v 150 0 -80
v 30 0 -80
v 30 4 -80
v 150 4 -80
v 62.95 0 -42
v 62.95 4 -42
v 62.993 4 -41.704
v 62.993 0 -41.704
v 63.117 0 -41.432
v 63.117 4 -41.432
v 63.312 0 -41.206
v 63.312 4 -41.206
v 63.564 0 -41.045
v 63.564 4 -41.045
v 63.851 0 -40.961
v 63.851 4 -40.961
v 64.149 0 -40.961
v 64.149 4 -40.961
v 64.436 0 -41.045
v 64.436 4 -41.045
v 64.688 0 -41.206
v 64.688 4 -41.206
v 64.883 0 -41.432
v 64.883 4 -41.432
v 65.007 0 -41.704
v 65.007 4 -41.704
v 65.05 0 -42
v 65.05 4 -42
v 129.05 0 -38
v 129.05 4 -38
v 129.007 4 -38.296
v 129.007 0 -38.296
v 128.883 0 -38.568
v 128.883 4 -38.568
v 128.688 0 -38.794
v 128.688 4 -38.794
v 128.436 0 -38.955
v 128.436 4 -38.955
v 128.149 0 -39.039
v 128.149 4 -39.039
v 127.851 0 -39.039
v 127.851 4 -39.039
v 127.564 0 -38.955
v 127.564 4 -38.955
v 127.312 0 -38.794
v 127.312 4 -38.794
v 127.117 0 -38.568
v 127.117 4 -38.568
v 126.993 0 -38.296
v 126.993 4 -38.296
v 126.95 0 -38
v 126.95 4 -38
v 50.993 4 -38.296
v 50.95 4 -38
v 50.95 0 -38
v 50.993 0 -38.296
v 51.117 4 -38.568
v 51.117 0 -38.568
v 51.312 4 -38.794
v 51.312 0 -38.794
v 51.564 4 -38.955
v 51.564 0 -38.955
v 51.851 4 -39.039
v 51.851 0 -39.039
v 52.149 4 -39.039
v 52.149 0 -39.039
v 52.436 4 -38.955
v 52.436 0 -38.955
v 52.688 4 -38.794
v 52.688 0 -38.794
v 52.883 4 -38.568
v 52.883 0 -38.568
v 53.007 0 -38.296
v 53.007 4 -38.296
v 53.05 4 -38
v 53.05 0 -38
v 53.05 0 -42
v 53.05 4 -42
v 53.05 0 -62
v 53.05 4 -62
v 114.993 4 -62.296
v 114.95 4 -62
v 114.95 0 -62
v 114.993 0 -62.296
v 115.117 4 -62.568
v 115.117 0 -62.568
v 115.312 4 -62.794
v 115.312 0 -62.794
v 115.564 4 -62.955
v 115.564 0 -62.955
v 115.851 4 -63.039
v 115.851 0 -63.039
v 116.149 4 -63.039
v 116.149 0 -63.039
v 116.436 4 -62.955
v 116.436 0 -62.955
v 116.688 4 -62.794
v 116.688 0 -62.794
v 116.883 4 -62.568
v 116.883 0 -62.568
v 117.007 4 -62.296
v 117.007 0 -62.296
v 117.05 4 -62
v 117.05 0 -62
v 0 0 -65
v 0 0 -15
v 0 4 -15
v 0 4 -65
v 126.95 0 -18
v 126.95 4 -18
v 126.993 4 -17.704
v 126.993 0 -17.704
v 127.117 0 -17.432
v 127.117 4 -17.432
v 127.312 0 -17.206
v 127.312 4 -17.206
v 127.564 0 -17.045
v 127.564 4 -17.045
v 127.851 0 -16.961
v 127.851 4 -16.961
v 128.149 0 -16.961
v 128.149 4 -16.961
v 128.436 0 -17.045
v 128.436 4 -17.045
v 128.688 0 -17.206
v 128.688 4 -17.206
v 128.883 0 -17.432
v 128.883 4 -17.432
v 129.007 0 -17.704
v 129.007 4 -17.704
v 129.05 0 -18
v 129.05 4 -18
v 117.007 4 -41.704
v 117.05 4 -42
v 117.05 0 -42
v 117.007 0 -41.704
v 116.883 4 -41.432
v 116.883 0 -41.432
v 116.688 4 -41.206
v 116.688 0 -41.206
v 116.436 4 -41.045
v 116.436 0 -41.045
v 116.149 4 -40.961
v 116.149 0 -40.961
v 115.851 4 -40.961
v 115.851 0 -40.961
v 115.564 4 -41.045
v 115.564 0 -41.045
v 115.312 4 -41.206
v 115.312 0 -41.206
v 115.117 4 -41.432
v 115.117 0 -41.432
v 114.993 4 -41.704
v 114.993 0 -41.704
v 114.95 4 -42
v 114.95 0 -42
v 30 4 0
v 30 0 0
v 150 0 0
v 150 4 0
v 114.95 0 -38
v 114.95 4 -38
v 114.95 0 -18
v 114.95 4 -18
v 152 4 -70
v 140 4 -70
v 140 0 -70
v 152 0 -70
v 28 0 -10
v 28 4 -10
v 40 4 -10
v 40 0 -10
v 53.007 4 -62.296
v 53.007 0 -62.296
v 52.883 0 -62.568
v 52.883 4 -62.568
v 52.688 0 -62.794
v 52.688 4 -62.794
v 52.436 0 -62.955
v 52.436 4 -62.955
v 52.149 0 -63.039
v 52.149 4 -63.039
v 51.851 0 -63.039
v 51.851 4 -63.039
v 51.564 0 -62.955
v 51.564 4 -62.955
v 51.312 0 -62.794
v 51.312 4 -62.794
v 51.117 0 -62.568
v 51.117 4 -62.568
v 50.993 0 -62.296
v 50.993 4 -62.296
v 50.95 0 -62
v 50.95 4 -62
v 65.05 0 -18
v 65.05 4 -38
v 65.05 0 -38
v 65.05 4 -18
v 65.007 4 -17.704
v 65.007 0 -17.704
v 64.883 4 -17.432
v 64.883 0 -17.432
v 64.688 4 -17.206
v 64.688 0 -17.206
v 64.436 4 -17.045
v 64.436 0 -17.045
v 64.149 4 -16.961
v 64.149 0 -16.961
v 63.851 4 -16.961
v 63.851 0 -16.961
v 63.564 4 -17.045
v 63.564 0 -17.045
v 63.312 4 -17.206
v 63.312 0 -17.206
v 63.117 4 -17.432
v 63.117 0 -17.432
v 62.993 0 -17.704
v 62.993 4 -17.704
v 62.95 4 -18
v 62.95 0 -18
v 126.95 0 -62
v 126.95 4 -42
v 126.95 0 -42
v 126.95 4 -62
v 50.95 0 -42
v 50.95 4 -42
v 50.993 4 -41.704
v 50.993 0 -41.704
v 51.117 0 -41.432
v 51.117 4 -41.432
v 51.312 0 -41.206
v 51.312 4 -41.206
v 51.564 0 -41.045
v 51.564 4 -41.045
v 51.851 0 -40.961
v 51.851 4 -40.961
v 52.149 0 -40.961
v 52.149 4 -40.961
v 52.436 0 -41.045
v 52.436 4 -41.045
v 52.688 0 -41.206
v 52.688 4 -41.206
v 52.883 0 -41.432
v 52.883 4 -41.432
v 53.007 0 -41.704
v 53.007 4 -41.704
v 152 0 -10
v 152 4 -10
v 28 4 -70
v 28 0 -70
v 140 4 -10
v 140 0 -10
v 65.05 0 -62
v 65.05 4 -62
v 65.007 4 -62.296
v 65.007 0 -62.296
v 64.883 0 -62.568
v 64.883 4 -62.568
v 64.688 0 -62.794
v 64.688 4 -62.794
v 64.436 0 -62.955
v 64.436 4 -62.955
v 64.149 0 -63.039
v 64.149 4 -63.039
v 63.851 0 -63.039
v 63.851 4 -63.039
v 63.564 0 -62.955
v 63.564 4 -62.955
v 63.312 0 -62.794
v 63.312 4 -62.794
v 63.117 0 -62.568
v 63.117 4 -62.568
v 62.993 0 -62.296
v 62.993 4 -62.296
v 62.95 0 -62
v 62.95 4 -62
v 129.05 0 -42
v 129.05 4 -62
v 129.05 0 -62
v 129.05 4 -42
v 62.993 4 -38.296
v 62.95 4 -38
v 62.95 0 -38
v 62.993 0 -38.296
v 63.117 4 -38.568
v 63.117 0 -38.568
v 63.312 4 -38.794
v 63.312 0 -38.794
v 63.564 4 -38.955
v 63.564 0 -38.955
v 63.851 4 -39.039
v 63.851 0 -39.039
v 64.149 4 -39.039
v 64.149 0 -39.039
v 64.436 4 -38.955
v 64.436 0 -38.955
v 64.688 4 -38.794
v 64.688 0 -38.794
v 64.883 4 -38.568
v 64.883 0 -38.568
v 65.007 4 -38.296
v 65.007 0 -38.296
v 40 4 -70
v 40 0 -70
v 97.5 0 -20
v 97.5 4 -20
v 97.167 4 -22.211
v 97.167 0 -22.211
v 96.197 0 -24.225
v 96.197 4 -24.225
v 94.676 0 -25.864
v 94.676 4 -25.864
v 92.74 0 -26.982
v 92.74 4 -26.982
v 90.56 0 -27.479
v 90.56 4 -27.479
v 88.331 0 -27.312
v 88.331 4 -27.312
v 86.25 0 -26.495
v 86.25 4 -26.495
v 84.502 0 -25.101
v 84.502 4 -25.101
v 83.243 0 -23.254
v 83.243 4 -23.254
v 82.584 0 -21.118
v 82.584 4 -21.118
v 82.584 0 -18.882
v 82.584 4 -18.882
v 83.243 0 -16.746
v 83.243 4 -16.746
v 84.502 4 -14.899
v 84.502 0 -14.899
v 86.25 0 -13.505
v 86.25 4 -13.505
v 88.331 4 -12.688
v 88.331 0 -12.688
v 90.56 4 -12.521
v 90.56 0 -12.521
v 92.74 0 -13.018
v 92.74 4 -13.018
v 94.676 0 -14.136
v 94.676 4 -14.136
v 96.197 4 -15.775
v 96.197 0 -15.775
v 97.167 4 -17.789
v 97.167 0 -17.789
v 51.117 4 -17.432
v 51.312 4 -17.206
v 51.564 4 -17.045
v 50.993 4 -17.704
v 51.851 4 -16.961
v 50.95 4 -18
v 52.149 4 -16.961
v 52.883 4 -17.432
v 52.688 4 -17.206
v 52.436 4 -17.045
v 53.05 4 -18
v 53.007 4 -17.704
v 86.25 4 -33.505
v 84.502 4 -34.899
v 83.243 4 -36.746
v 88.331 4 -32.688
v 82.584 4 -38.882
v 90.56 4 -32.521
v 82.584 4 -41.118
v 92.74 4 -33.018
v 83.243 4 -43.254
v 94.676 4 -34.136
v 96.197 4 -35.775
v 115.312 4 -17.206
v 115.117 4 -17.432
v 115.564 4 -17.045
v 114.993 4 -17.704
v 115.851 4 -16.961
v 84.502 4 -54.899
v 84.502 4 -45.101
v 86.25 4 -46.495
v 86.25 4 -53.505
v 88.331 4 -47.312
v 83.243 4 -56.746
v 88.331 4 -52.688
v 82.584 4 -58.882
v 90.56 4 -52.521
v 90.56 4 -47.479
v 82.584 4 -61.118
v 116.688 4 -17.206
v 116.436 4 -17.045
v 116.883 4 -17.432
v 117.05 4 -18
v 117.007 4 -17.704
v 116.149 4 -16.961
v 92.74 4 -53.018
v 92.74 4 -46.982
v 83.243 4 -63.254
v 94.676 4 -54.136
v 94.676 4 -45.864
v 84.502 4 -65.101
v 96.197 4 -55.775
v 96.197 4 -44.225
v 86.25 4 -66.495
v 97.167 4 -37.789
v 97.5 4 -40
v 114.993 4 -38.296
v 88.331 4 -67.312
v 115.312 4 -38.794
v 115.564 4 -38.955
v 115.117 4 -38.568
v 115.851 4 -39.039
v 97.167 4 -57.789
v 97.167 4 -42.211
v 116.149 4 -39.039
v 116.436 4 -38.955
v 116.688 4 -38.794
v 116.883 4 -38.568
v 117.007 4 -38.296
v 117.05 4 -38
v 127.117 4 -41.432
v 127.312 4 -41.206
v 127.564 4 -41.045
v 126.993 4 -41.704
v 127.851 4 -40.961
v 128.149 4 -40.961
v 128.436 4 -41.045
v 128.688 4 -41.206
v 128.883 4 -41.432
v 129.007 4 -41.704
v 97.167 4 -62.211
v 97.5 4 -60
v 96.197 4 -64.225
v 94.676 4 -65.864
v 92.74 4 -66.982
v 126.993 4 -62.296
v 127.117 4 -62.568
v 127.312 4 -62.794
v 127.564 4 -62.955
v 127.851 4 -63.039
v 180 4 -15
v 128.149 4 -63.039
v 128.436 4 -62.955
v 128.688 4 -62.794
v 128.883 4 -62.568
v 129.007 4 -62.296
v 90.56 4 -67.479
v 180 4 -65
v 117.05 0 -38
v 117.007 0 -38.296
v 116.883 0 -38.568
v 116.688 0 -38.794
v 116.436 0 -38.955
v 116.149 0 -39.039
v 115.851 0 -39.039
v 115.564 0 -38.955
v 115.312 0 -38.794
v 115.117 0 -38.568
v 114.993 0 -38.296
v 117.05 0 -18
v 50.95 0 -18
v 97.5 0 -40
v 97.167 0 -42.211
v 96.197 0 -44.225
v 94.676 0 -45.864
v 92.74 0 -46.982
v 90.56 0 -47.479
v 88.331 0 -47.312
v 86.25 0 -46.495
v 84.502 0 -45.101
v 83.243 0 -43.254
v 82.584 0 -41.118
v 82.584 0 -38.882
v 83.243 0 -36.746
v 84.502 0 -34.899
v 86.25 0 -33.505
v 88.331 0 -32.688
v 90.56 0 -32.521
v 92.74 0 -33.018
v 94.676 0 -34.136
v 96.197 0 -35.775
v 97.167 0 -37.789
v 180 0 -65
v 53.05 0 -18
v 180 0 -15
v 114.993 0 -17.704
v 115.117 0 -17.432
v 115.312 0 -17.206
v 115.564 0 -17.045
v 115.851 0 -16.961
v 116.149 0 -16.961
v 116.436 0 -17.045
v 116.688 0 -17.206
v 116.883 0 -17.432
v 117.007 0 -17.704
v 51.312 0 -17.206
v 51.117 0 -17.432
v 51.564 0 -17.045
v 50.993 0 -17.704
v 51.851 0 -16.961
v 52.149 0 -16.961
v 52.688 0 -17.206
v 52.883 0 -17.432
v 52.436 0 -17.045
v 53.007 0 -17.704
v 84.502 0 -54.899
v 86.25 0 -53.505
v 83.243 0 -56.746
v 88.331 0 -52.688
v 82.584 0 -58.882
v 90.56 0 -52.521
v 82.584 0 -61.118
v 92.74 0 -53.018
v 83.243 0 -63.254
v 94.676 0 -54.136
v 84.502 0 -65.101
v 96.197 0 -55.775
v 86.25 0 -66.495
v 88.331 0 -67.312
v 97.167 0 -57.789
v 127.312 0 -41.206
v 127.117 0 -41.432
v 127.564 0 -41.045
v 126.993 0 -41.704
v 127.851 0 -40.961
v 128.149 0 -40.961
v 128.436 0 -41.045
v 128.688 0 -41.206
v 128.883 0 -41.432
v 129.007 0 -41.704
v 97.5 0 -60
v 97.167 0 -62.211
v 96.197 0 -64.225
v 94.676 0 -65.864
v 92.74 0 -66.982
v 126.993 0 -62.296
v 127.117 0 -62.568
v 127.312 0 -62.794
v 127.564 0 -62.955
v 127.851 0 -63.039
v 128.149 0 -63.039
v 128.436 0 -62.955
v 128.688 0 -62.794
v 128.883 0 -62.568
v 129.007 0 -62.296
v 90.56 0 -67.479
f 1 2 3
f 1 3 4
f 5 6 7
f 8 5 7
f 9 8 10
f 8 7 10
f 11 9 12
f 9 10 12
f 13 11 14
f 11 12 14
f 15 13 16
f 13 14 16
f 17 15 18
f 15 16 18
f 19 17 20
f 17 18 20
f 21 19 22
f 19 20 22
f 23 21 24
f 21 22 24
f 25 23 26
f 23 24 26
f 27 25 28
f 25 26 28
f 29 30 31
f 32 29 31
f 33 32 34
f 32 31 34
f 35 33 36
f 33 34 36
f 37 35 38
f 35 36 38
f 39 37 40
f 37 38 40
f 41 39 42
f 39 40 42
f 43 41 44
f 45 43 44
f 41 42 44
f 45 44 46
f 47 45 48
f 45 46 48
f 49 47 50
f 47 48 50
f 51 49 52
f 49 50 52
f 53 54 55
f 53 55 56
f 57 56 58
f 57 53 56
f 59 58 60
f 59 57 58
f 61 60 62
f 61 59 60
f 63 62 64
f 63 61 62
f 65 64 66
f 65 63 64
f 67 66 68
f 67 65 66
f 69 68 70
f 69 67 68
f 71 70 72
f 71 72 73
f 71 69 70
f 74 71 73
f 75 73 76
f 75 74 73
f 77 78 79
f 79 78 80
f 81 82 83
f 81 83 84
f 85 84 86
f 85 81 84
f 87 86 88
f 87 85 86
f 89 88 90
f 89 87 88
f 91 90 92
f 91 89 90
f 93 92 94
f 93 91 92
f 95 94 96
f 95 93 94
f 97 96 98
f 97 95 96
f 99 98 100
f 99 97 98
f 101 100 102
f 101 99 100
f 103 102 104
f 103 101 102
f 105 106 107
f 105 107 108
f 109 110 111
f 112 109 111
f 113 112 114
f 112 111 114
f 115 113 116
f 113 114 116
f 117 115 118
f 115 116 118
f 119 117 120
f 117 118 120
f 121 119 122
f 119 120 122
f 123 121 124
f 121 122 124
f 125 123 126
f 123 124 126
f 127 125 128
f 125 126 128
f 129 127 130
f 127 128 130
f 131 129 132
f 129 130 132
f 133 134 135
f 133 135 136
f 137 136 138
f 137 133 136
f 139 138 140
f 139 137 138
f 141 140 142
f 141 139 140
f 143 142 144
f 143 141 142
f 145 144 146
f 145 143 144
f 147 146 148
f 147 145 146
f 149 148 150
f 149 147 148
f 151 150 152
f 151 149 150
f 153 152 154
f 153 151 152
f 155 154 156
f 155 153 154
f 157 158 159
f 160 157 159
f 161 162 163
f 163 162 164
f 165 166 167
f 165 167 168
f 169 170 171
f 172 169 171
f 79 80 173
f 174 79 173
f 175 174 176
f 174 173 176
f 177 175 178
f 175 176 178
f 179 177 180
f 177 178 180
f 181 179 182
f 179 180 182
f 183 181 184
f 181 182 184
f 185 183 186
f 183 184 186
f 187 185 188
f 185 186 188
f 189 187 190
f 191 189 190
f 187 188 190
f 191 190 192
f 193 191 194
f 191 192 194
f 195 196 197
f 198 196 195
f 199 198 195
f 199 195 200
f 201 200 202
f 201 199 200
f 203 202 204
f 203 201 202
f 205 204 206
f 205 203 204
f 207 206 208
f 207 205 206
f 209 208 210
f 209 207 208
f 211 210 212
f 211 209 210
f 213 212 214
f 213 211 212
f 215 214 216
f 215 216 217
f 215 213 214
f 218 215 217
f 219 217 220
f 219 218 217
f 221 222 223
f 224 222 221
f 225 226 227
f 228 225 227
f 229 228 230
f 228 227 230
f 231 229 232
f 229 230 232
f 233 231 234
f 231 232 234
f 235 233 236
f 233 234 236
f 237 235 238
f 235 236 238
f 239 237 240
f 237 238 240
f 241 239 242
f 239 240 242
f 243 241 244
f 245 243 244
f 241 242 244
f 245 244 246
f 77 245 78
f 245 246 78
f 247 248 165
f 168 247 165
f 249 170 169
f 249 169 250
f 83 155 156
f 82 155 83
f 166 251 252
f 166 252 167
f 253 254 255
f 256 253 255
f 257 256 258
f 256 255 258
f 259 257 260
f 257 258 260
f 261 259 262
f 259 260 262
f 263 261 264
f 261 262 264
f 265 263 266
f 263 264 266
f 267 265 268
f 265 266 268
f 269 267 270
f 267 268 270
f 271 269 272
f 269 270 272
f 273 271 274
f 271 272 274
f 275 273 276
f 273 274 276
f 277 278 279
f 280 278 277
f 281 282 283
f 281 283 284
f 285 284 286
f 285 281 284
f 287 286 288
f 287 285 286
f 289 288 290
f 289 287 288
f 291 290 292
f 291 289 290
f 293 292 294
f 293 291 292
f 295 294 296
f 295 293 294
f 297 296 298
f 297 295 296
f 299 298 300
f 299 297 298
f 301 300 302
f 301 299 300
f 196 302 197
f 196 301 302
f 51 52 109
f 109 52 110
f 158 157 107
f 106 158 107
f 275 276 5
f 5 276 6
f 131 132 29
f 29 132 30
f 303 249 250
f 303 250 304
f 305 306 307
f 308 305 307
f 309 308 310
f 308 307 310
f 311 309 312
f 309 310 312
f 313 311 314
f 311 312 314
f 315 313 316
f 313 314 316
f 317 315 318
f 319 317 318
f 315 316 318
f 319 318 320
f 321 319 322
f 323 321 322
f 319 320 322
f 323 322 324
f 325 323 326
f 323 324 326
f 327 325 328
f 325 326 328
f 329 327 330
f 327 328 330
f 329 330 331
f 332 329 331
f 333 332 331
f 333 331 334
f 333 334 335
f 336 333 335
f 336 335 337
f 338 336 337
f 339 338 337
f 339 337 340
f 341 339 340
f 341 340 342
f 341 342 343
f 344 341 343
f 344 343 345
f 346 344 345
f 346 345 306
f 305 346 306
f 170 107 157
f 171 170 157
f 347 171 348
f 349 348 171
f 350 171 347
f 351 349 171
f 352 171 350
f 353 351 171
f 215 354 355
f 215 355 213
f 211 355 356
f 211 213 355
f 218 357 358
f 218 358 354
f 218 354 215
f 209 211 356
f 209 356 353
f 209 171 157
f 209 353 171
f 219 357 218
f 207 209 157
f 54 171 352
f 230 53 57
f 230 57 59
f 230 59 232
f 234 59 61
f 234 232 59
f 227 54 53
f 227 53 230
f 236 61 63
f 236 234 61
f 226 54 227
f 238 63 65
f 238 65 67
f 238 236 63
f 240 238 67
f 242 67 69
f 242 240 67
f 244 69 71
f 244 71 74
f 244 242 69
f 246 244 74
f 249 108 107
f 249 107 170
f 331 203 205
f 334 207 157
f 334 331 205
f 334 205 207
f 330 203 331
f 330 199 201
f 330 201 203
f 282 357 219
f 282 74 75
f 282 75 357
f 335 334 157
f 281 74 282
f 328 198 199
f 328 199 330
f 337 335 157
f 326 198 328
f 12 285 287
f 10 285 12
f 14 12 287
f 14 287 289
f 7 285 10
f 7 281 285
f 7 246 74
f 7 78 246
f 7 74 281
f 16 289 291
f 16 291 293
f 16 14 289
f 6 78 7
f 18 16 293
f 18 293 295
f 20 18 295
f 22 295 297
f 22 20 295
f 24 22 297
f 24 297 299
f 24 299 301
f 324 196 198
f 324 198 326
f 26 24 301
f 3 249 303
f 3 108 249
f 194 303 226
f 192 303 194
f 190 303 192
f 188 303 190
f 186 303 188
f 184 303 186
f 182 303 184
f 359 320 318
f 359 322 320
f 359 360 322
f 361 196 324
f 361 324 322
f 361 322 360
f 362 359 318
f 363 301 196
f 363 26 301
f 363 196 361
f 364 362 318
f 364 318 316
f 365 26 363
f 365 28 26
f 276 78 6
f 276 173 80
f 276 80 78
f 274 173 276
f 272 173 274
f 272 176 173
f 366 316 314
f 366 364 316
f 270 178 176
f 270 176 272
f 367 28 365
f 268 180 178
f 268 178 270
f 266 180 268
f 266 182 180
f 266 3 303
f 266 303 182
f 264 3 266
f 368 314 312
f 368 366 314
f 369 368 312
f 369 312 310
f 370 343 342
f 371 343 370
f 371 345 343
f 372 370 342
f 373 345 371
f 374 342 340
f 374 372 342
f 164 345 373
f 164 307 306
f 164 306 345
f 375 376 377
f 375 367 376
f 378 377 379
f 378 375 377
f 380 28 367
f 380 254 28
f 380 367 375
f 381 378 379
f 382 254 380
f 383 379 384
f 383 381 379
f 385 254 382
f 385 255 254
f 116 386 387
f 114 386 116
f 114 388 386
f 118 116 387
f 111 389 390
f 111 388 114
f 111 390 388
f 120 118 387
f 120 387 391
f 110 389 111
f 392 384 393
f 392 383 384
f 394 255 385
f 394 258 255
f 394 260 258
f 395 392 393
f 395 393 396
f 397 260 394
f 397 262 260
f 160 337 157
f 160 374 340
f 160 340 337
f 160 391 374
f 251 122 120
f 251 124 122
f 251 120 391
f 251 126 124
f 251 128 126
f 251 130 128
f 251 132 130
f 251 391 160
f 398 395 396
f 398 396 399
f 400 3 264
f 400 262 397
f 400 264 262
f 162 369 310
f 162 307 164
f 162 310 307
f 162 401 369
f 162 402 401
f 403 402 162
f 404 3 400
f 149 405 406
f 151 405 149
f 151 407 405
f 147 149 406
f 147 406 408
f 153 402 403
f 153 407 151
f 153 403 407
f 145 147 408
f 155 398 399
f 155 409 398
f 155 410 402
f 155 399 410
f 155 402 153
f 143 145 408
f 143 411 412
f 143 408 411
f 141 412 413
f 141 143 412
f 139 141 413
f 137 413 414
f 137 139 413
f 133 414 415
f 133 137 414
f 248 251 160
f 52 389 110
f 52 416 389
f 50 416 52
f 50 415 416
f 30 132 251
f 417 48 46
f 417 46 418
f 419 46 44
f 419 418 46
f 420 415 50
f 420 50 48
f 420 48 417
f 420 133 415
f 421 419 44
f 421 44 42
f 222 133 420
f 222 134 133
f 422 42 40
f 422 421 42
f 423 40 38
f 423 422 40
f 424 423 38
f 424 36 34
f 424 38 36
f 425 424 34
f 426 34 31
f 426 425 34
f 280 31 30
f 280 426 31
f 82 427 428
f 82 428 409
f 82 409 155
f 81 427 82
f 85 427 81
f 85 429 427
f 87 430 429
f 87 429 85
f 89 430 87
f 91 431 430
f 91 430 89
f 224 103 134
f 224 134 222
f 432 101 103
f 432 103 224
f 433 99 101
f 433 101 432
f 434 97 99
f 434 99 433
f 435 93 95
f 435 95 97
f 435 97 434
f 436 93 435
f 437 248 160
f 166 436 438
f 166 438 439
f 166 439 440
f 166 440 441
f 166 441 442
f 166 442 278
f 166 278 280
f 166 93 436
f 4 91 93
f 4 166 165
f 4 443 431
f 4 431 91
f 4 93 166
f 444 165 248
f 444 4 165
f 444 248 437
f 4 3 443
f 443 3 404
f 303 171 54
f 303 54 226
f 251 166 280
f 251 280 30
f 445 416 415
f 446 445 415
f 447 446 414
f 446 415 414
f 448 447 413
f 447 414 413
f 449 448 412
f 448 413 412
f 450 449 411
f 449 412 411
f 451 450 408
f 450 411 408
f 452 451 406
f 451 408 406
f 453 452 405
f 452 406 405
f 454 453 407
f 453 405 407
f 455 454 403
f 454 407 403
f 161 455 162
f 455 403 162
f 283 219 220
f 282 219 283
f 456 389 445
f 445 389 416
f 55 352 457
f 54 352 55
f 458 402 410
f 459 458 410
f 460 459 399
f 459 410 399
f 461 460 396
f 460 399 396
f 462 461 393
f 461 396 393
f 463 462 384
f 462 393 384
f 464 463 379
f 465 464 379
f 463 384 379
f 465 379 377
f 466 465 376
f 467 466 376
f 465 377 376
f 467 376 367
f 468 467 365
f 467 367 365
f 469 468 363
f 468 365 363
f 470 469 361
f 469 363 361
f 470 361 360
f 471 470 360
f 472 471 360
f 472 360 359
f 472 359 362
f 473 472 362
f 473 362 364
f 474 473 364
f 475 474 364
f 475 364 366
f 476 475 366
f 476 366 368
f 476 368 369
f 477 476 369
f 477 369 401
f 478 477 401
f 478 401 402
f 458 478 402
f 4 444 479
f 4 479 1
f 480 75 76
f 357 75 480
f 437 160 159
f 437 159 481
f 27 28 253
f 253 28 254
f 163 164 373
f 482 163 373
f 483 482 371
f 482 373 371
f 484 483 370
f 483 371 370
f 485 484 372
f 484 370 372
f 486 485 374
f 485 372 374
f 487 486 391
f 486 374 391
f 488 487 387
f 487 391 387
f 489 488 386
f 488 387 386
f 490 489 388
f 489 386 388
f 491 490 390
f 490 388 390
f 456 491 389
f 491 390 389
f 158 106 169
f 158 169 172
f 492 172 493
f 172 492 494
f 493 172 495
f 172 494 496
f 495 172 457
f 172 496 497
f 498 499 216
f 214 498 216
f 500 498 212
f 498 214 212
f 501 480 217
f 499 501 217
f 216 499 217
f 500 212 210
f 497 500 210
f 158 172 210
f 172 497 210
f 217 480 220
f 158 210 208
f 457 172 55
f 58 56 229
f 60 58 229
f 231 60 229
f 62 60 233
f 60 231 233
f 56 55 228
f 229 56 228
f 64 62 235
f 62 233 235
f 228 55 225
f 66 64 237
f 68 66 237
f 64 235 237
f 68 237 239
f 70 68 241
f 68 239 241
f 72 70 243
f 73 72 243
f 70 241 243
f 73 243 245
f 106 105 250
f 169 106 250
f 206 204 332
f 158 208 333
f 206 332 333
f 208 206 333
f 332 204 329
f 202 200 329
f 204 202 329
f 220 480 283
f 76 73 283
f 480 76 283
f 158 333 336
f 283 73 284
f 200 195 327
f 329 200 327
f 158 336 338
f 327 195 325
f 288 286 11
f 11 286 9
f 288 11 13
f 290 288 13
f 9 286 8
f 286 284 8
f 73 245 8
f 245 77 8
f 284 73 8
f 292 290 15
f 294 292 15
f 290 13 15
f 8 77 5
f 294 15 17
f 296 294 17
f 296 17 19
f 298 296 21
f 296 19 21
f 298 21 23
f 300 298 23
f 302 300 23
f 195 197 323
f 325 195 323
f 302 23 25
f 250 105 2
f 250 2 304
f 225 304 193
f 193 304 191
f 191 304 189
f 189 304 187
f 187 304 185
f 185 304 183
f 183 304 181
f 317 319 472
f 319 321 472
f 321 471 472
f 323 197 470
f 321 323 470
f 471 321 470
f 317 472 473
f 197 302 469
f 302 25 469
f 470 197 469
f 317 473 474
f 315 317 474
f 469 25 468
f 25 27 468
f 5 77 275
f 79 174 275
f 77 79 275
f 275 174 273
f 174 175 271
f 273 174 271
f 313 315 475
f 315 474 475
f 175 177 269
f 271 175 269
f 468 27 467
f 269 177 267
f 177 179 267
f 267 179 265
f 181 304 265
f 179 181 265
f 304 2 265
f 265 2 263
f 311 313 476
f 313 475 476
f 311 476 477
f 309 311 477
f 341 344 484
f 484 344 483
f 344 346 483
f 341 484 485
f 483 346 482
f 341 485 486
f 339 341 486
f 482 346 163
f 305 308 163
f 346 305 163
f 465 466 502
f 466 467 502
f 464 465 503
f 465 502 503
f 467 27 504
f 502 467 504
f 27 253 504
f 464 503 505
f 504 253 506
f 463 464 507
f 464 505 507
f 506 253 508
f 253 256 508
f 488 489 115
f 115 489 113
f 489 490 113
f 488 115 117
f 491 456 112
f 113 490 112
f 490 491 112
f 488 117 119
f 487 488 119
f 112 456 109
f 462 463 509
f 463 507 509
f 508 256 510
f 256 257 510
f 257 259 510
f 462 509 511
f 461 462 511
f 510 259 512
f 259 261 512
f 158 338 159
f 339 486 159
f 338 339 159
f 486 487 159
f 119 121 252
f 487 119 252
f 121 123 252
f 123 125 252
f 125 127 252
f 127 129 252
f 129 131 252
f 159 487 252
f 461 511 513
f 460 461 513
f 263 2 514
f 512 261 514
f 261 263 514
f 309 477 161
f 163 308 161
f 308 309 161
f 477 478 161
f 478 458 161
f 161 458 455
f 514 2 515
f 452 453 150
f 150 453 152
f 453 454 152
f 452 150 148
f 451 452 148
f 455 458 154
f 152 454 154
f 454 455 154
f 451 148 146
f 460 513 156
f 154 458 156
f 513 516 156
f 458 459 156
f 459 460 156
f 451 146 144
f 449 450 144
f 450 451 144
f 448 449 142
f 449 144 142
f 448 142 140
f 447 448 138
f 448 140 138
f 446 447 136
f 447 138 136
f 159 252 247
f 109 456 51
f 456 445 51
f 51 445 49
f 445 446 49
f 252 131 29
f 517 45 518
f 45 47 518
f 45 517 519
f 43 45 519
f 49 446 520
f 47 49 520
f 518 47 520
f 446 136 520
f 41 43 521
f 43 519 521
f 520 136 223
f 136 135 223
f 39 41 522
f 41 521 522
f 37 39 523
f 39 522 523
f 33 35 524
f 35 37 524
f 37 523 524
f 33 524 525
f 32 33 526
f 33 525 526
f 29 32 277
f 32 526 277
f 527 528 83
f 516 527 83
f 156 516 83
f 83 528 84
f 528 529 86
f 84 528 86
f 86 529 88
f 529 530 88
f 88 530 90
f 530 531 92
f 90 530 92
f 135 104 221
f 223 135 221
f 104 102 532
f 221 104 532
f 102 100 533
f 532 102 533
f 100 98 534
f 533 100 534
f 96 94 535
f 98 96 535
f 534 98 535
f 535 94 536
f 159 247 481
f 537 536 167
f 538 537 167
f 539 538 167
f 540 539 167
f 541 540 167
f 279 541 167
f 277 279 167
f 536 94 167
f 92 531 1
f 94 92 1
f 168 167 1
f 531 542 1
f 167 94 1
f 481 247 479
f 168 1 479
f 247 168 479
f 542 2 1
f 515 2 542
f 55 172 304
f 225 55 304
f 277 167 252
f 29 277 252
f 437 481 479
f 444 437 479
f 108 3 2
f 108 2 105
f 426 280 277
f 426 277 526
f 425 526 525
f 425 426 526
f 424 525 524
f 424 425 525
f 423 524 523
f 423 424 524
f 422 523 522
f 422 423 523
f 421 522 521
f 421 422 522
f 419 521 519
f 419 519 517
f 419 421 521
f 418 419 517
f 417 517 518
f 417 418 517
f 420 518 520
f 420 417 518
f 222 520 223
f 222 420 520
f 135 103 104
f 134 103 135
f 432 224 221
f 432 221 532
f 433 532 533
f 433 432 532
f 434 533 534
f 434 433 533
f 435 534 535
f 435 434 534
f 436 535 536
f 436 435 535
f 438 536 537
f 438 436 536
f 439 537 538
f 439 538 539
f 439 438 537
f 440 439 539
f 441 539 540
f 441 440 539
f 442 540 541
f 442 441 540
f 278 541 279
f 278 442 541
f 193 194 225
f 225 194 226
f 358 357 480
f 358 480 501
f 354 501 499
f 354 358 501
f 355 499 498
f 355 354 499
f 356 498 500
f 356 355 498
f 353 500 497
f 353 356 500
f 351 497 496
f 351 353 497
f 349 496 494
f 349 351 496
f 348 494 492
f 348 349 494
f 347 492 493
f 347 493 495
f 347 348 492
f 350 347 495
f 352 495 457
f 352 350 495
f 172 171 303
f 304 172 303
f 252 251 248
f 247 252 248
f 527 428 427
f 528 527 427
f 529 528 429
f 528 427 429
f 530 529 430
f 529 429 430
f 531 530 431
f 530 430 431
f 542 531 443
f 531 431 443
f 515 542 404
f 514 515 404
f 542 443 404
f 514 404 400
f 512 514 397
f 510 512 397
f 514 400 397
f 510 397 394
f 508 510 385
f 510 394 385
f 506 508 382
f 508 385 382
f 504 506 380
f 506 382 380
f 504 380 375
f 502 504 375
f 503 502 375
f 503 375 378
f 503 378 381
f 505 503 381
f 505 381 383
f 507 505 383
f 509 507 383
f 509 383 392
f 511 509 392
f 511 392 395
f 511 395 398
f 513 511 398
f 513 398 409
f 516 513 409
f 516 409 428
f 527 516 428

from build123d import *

# Parameters (mm, degrees)
ESQUISSE1_W                         = 180
ESQUISSE1_H                         = 80
BOSS_EXTRU_1_DEPTH                  = 4
ENL_V_MAT_EXTRU_1_DEPTH             = 4
ENL_V_MAT_EXTRU_2_DEPTH             = 4
ENL_V_MAT_EXTRU_5_REACH             = 6
ESQUISSE11_W                        = 12
ESQUISSE11_H                        = 60
ENL_V_MAT_EXTRU_5_DIRECTION_2_DEPTH = 1
ENL_V_MAT_EXTRU_6_REACH             = 6
ESQUISSE14_R                        = 7.5


with BuildPart() as part:
    # Esquisse1 → Boss.-Extru.1 (new body)
    with BuildSketch(Plane(origin=(0, 0, 0), x_dir=(1, 0, 0), z_dir=(0, 1, 0))):
        with Locations((90, 40)):
            Rectangle(ESQUISSE1_W, ESQUISSE1_H)
    extrude(amount=BOSS_EXTRU_1_DEPTH)

    # Esquisse2 → Enlèv. mat.-Extru.1 (cut)
    with BuildSketch(Plane(origin=(0, 4, 0), x_dir=(1, 0, 0), z_dir=(0, 1, 0))):
        Polygon((30, 0), (0, 15), (0, 0), align=None)
        Polygon((30, 80), (0, 65), (0, 80), align=None)
        Polygon((150, 0), (180, 15), (180, 0), align=None)
        Polygon((150, 80), (180, 80), (180, 65), align=None)
    extrude(amount=-ENL_V_MAT_EXTRU_1_DEPTH, mode=Mode.SUBTRACT)

    # Esquisse3 → Enlèv. mat.-Extru.2 (cut)
    with BuildSketch(Plane(origin=(0, 4, 0), x_dir=(1, 0, 0), z_dir=(0, 1, 0))):
        with BuildLine():
            Line((65.05, 38), (65.05, 18))
            ThreePointArc((65.05, 18), (64, 16.95), (62.95, 18))
            Line((62.95, 18), (62.95, 38))
            ThreePointArc((62.95, 38), (64, 39.05), (65.05, 38))
        make_face()
        with BuildLine():
            Line((50.95, 18), (50.95, 38))
            ThreePointArc((50.95, 38), (52, 39.05), (53.05, 38))
            Line((53.05, 38), (53.05, 18))
            ThreePointArc((53.05, 18), (52, 16.95), (50.95, 18))
        make_face()
        with BuildLine():
            Line((129.05, 18), (129.05, 38))
            ThreePointArc((129.05, 38), (128, 39.05), (126.95, 38))
            Line((126.95, 38), (126.95, 18))
            ThreePointArc((126.95, 18), (128, 16.95), (129.05, 18))
        make_face()
        with BuildLine():
            Line((114.95, 38), (114.95, 18))
            ThreePointArc((114.95, 18), (116, 16.95), (117.05, 18))
            Line((117.05, 18), (117.05, 38))
            ThreePointArc((117.05, 38), (116, 39.05), (114.95, 38))
        make_face()
        with BuildLine():
            Line((50.95, 62), (50.95, 42))
            ThreePointArc((50.95, 42), (52, 40.95), (53.05, 42))
            Line((53.05, 42), (53.05, 62))
            ThreePointArc((53.05, 62), (52, 63.05), (50.95, 62))
        make_face()
        with BuildLine():
            Line((65.05, 42), (65.05, 62))
            ThreePointArc((65.05, 62), (64, 63.05), (62.95, 62))
            Line((62.95, 62), (62.95, 42))
            ThreePointArc((62.95, 42), (64, 40.95), (65.05, 42))
        make_face()
        with BuildLine():
            Line((114.95, 42), (114.95, 62))
            ThreePointArc((114.95, 62), (116, 63.05), (117.05, 62))
            Line((117.05, 62), (117.05, 42))
            ThreePointArc((117.05, 42), (116, 40.95), (114.95, 42))
        make_face()
        with BuildLine():
            Line((129.05, 62), (129.05, 42))
            ThreePointArc((129.05, 42), (128, 40.95), (126.95, 42))
            Line((126.95, 42), (126.95, 62))
            ThreePointArc((126.95, 62), (128, 63.05), (129.05, 62))
        make_face()
    extrude(amount=-ENL_V_MAT_EXTRU_2_DEPTH, mode=Mode.SUBTRACT)

    # Esquisse11 → Enlèv. mat.-Extru.5 (cut, up to next)
    with BuildSketch(Plane(origin=(0, 4, 0), x_dir=(1, 0, 0), z_dir=(0, 1, 0)), mode=Mode.PRIVATE) as enl_v_mat_extru_5_sk1:
        with Locations((34, 40)):
            Rectangle(ESQUISSE11_W, ESQUISSE11_H)
    enl_v_mat_extru_5_tool1 = extrude(enl_v_mat_extru_5_sk1.sketch, amount=-ENL_V_MAT_EXTRU_5_REACH, mode=Mode.PRIVATE) & part.part
    add(enl_v_mat_extru_5_tool1.solids().sort_by_distance((34, 4, -40))[0], mode=Mode.SUBTRACT)
    # Esquisse11 → Enlèv. mat.-Extru.5 (cut, up to next)
    with BuildSketch(Plane(origin=(0, 4, 0), x_dir=(1, 0, 0), z_dir=(0, 1, 0)), mode=Mode.PRIVATE) as enl_v_mat_extru_5_sk2:
        with Locations((146, 40)):
            Rectangle(ESQUISSE11_W, ESQUISSE11_H)
    enl_v_mat_extru_5_tool2 = extrude(enl_v_mat_extru_5_sk2.sketch, amount=-ENL_V_MAT_EXTRU_5_REACH, mode=Mode.PRIVATE) & part.part
    add(enl_v_mat_extru_5_tool2.solids().sort_by_distance((146, 4, -40))[0], mode=Mode.SUBTRACT)

    # Esquisse11 → Enlèv. mat.-Extru.5 direction 2 (cut)
    with BuildSketch(Plane(origin=(0, 4, 0), x_dir=(1, 0, 0), z_dir=(0, 1, 0))):
        with Locations((34, 40)):
            Rectangle(ESQUISSE11_W, ESQUISSE11_H)
        with Locations((146, 40)):
            Rectangle(ESQUISSE11_W, ESQUISSE11_H)
    extrude(amount=ENL_V_MAT_EXTRU_5_DIRECTION_2_DEPTH, mode=Mode.SUBTRACT)

    # Esquisse14 → Enlèv. mat.-Extru.6 (cut, up to next)
    with BuildSketch(Plane(origin=(0, 4, 0), x_dir=(1, 0, 0), z_dir=(0, 1, 0)), mode=Mode.PRIVATE) as enl_v_mat_extru_6_sk1:
        with Locations((90, 60)):
            Circle(ESQUISSE14_R)
    enl_v_mat_extru_6_tool1 = extrude(enl_v_mat_extru_6_sk1.sketch, amount=-ENL_V_MAT_EXTRU_6_REACH, mode=Mode.PRIVATE) & part.part
    add(enl_v_mat_extru_6_tool1.solids().sort_by_distance((90, 4, -60))[0], mode=Mode.SUBTRACT)
    # Esquisse14 → Enlèv. mat.-Extru.6 (cut, up to next)
    with BuildSketch(Plane(origin=(0, 4, 0), x_dir=(1, 0, 0), z_dir=(0, 1, 0)), mode=Mode.PRIVATE) as enl_v_mat_extru_6_sk2:
        with Locations((90, 40)):
            Circle(ESQUISSE14_R)
    enl_v_mat_extru_6_tool2 = extrude(enl_v_mat_extru_6_sk2.sketch, amount=-ENL_V_MAT_EXTRU_6_REACH, mode=Mode.PRIVATE) & part.part
    add(enl_v_mat_extru_6_tool2.solids().sort_by_distance((90, 4, -40))[0], mode=Mode.SUBTRACT)
    # Esquisse14 → Enlèv. mat.-Extru.6 (cut, up to next)
    with BuildSketch(Plane(origin=(0, 4, 0), x_dir=(1, 0, 0), z_dir=(0, 1, 0)), mode=Mode.PRIVATE) as enl_v_mat_extru_6_sk3:
        with Locations((90, 20)):
            Circle(ESQUISSE14_R)
    enl_v_mat_extru_6_tool3 = extrude(enl_v_mat_extru_6_sk3.sketch, amount=-ENL_V_MAT_EXTRU_6_REACH, mode=Mode.PRIVATE) & part.part
    add(enl_v_mat_extru_6_tool3.solids().sort_by_distance((90, 4, -20))[0], mode=Mode.SUBTRACT)


solid = part.part
